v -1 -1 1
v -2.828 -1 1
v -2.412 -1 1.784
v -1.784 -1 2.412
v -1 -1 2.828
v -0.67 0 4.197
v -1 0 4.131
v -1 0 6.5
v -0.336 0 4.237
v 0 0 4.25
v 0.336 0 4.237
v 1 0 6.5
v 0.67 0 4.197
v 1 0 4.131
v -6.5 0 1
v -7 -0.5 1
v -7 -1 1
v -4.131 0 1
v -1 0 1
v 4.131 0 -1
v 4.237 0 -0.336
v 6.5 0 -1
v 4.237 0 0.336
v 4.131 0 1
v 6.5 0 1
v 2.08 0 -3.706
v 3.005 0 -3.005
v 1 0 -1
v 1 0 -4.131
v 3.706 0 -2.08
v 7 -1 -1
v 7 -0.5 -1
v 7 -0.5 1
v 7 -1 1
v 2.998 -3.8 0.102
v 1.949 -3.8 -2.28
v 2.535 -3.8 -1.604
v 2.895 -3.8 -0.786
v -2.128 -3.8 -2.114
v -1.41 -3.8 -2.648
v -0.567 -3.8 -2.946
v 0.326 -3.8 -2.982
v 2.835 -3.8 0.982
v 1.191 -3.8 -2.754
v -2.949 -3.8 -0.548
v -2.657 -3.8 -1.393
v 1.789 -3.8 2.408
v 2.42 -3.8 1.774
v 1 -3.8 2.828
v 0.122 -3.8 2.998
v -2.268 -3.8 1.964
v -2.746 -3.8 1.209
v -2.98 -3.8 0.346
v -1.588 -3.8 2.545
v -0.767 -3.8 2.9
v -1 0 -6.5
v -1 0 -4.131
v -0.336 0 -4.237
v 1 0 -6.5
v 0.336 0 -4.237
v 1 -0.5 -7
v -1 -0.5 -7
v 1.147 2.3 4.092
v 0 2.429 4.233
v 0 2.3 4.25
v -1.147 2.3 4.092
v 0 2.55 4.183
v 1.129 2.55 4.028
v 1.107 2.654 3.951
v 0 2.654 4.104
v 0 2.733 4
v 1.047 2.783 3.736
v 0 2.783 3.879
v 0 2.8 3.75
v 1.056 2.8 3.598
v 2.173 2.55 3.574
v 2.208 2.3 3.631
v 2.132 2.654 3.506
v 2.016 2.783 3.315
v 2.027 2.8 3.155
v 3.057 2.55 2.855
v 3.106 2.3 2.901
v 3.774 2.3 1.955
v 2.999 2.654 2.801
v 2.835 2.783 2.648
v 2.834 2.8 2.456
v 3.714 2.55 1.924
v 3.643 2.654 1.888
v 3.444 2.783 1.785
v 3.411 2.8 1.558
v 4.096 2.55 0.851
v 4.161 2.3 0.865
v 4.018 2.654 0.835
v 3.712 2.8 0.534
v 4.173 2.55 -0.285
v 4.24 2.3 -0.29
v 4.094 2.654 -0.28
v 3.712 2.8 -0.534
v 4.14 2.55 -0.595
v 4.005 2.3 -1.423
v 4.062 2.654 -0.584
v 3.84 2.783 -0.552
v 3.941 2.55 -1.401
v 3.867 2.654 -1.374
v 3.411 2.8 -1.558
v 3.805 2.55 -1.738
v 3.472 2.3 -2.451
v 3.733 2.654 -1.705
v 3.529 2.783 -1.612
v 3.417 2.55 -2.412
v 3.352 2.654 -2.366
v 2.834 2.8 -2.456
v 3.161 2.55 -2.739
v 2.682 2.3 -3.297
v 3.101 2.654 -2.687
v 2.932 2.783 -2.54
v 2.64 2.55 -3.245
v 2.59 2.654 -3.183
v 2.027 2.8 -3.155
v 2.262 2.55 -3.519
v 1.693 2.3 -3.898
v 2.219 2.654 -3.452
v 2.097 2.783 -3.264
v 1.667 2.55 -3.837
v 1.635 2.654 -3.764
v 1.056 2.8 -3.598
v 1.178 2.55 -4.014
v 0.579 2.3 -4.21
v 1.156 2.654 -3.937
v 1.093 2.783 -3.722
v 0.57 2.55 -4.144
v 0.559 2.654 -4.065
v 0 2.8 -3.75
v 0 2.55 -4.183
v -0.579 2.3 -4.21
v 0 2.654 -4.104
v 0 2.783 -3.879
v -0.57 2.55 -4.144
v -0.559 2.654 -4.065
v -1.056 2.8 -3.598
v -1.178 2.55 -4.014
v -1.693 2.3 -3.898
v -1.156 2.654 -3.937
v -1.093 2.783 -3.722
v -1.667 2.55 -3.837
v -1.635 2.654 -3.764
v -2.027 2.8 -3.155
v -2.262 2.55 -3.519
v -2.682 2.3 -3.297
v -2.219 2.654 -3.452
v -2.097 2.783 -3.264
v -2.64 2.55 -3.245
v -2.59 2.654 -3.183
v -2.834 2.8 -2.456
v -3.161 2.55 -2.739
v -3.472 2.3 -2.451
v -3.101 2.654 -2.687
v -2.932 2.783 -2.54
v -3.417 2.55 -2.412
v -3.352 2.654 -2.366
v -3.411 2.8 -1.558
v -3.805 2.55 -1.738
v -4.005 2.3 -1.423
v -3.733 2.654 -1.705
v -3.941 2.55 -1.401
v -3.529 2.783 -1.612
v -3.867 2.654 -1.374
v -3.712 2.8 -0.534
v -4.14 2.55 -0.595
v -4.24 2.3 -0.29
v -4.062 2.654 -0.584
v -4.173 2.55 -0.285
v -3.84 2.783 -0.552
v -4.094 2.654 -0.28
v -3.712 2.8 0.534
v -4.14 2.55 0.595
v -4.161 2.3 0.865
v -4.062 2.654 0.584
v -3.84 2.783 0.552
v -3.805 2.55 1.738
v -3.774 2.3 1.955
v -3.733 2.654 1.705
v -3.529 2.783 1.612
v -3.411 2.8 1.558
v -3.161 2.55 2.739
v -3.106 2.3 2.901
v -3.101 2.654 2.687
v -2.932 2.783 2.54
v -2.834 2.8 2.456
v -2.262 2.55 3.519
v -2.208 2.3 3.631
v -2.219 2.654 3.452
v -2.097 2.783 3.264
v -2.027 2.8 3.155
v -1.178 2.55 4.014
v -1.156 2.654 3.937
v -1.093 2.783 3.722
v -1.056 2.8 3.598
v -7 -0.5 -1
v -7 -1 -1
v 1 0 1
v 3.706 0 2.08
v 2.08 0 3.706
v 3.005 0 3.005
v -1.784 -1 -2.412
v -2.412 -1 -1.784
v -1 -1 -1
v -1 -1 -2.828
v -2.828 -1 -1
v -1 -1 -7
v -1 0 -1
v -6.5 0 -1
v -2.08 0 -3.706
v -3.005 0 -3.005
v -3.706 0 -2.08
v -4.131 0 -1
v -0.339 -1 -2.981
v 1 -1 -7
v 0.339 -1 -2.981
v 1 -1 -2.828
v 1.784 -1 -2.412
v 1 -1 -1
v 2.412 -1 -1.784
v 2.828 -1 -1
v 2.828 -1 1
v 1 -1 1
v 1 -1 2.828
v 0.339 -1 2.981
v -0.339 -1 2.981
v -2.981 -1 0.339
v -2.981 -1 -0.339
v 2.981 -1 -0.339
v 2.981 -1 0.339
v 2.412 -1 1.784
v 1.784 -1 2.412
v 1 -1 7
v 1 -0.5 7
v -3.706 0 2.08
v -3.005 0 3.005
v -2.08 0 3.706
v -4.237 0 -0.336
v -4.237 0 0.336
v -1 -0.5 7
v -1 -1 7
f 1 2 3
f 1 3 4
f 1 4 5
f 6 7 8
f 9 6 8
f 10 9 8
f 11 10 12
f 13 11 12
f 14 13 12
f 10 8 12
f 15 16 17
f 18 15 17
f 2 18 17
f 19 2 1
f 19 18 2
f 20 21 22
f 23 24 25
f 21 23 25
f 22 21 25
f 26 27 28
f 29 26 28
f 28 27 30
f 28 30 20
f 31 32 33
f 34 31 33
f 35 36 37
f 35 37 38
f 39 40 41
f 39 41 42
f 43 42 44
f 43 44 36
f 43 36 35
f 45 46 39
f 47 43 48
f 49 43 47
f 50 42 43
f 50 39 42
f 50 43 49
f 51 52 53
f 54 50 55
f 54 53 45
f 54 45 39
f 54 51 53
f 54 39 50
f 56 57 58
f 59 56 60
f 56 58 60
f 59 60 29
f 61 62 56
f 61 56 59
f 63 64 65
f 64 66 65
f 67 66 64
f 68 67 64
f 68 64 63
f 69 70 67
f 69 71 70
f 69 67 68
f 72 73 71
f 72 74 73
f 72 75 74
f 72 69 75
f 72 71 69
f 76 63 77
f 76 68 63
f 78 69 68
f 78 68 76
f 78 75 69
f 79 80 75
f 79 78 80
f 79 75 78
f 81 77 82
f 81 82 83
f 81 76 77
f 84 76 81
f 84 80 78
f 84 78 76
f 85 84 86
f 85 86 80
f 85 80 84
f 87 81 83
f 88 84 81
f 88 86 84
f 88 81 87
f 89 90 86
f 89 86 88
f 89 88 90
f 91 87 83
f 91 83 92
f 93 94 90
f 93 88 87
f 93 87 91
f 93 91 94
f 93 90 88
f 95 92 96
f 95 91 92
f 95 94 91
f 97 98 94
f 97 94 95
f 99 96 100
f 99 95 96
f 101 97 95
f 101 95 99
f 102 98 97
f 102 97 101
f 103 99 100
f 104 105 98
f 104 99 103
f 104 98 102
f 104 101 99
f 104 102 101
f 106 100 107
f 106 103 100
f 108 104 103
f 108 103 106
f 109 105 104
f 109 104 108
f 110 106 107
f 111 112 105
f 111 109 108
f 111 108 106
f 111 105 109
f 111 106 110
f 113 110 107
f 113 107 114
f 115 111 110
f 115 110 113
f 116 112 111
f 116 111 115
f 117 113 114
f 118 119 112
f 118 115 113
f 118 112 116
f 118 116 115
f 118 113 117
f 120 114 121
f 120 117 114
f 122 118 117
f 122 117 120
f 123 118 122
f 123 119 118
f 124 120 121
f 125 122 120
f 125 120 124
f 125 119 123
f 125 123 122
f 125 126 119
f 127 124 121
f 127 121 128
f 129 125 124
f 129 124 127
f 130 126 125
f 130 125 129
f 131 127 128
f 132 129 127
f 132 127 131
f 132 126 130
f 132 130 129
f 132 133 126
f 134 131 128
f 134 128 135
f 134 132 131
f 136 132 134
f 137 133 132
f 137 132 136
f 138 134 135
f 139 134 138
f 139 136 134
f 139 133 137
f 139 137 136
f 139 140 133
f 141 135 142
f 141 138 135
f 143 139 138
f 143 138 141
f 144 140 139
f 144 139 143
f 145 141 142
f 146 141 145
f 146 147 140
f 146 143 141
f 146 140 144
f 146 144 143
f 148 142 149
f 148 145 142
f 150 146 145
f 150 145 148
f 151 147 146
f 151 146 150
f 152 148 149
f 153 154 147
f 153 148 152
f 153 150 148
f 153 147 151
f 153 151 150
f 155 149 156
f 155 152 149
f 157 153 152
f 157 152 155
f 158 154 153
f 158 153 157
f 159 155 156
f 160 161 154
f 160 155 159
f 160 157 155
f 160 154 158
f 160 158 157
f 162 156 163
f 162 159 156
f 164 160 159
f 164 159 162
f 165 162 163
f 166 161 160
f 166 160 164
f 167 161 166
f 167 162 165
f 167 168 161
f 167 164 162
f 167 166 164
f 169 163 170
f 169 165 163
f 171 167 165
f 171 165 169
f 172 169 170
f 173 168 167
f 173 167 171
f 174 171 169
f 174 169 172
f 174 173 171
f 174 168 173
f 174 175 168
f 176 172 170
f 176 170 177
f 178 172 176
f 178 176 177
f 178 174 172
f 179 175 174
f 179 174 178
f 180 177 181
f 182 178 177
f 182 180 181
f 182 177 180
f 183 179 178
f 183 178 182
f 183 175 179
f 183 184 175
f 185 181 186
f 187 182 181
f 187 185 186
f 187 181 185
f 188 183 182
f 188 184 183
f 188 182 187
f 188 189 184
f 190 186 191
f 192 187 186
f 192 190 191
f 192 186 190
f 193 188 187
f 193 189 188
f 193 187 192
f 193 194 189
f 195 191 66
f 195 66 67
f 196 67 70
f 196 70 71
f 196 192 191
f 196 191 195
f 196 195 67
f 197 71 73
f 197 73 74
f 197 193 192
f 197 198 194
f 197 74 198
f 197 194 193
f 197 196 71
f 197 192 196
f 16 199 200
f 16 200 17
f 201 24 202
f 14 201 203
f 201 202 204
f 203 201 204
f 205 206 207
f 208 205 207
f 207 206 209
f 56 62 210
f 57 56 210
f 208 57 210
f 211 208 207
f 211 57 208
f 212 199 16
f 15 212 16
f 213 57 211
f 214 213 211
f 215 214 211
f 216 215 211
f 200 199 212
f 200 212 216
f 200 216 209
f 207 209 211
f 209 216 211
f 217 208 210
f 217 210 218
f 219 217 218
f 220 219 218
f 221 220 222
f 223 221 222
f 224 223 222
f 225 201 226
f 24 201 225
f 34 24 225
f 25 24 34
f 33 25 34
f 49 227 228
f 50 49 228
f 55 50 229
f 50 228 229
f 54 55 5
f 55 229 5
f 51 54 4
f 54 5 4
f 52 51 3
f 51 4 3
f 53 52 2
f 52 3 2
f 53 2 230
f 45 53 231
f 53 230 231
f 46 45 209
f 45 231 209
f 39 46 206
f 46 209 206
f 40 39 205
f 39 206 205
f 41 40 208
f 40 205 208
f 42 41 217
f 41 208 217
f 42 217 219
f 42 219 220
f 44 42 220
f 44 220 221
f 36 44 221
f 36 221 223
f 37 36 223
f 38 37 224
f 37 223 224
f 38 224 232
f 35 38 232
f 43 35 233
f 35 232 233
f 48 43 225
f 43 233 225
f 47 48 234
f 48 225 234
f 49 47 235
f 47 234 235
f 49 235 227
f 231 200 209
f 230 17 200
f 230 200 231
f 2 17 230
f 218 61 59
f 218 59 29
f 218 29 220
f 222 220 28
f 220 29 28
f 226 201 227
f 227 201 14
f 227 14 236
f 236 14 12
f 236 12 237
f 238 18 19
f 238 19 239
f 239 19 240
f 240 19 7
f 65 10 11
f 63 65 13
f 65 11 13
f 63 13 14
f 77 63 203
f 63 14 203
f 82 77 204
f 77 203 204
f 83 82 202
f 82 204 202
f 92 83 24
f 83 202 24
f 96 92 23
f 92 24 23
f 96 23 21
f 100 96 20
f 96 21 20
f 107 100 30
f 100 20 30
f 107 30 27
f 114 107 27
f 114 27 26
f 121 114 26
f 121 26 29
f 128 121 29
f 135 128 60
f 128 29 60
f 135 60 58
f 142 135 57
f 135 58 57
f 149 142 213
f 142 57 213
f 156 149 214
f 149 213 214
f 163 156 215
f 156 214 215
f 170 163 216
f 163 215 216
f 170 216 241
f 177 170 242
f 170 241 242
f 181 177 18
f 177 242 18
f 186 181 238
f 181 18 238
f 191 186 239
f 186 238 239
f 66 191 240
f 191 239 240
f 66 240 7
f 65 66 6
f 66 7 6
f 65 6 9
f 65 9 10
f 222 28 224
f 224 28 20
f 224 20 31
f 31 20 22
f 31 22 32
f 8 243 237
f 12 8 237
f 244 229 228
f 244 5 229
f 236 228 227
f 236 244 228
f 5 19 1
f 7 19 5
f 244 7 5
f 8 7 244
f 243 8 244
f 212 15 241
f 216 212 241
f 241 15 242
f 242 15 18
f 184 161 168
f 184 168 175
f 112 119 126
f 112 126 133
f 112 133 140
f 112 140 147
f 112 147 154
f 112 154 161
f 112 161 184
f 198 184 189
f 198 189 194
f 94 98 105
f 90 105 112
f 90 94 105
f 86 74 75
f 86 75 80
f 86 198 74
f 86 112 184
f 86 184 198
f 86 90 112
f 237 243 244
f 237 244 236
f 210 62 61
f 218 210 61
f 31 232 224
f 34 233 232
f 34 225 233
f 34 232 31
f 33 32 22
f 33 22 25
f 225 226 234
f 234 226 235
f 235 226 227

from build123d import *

# Parameters (mm, degrees)
SKETCH_1_R      = 4.25
EXTRUDE_1_DEPTH = 2.8
FILLET_1_R      = 0.5
SKETCH_2_W      = 14
SKETCH_2_H      = 2
EXTRUDE_2_DEPTH = 1
SKETCH_3_W      = 2
SKETCH_3_H      = 14
EXTRUDE_3_DEPTH = 1
CHAMFER_1_SIZE  = 0.5
CHAMFER_2_SIZE  = 0.5
CHAMFER_3_SIZE  = 0.5
SKETCH_4_R      = 3
EXTRUDE_4_DEPTH = 2.8


with BuildPart() as part:
    # 草图1 → 凸台-拉伸1 (new body)
    with BuildSketch(Plane(origin=(0, 0, 0), x_dir=(1, 0, 0), z_dir=(0, 1, 0))):
        with Locations(Location((0, 0, 0), (0, 0, 270))):
            Circle(SKETCH_1_R)
    extrude(amount=EXTRUDE_1_DEPTH)

    # 圆角1
    fillet_1_edges = [part.edges().sort_by_distance(p)[0] for p in [
        (0, 2.8, -4.25),
    ]]
    fillet(fillet_1_edges, radius=FILLET_1_R)

    # 草图2 → 凸台-拉伸2 (add)
    with BuildSketch(Plane.XZ):
        Rectangle(SKETCH_2_W, SKETCH_2_H)
    extrude(amount=EXTRUDE_2_DEPTH)

    # 草图3 → 凸台-拉伸3 (add)
    with BuildSketch(Plane.XZ):
        Rectangle(SKETCH_3_W, SKETCH_3_H)
    extrude(amount=EXTRUDE_3_DEPTH)

    # 倒角1
    chamfer_1_edges = [part.edges().sort_by_distance(p)[0] for p in [
        (0, 0, 7),
    ]]
    chamfer(chamfer_1_edges, length=CHAMFER_1_SIZE)

    # 倒角2
    chamfer_2_edges = [part.edges().sort_by_distance(p)[0] for p in [
        (7, 0, 0),
    ]]
    chamfer(chamfer_2_edges, length=CHAMFER_2_SIZE)

    # 倒角3
    chamfer_3_edges = [part.edges().sort_by_distance(p)[0] for p in [
        (-7, 0, 0),
        (0, 0, -7),
    ]]
    chamfer(chamfer_3_edges, length=CHAMFER_3_SIZE)

    # 草图4 → 凸台-拉伸4 (add)
    with BuildSketch(Plane.XZ.offset(1)):
        with Locations(Location((0, 0, 0), (0, 0, 70.528779366))):
            Circle(SKETCH_4_R)
    extrude(amount=EXTRUDE_4_DEPTH)


solid = part.part
